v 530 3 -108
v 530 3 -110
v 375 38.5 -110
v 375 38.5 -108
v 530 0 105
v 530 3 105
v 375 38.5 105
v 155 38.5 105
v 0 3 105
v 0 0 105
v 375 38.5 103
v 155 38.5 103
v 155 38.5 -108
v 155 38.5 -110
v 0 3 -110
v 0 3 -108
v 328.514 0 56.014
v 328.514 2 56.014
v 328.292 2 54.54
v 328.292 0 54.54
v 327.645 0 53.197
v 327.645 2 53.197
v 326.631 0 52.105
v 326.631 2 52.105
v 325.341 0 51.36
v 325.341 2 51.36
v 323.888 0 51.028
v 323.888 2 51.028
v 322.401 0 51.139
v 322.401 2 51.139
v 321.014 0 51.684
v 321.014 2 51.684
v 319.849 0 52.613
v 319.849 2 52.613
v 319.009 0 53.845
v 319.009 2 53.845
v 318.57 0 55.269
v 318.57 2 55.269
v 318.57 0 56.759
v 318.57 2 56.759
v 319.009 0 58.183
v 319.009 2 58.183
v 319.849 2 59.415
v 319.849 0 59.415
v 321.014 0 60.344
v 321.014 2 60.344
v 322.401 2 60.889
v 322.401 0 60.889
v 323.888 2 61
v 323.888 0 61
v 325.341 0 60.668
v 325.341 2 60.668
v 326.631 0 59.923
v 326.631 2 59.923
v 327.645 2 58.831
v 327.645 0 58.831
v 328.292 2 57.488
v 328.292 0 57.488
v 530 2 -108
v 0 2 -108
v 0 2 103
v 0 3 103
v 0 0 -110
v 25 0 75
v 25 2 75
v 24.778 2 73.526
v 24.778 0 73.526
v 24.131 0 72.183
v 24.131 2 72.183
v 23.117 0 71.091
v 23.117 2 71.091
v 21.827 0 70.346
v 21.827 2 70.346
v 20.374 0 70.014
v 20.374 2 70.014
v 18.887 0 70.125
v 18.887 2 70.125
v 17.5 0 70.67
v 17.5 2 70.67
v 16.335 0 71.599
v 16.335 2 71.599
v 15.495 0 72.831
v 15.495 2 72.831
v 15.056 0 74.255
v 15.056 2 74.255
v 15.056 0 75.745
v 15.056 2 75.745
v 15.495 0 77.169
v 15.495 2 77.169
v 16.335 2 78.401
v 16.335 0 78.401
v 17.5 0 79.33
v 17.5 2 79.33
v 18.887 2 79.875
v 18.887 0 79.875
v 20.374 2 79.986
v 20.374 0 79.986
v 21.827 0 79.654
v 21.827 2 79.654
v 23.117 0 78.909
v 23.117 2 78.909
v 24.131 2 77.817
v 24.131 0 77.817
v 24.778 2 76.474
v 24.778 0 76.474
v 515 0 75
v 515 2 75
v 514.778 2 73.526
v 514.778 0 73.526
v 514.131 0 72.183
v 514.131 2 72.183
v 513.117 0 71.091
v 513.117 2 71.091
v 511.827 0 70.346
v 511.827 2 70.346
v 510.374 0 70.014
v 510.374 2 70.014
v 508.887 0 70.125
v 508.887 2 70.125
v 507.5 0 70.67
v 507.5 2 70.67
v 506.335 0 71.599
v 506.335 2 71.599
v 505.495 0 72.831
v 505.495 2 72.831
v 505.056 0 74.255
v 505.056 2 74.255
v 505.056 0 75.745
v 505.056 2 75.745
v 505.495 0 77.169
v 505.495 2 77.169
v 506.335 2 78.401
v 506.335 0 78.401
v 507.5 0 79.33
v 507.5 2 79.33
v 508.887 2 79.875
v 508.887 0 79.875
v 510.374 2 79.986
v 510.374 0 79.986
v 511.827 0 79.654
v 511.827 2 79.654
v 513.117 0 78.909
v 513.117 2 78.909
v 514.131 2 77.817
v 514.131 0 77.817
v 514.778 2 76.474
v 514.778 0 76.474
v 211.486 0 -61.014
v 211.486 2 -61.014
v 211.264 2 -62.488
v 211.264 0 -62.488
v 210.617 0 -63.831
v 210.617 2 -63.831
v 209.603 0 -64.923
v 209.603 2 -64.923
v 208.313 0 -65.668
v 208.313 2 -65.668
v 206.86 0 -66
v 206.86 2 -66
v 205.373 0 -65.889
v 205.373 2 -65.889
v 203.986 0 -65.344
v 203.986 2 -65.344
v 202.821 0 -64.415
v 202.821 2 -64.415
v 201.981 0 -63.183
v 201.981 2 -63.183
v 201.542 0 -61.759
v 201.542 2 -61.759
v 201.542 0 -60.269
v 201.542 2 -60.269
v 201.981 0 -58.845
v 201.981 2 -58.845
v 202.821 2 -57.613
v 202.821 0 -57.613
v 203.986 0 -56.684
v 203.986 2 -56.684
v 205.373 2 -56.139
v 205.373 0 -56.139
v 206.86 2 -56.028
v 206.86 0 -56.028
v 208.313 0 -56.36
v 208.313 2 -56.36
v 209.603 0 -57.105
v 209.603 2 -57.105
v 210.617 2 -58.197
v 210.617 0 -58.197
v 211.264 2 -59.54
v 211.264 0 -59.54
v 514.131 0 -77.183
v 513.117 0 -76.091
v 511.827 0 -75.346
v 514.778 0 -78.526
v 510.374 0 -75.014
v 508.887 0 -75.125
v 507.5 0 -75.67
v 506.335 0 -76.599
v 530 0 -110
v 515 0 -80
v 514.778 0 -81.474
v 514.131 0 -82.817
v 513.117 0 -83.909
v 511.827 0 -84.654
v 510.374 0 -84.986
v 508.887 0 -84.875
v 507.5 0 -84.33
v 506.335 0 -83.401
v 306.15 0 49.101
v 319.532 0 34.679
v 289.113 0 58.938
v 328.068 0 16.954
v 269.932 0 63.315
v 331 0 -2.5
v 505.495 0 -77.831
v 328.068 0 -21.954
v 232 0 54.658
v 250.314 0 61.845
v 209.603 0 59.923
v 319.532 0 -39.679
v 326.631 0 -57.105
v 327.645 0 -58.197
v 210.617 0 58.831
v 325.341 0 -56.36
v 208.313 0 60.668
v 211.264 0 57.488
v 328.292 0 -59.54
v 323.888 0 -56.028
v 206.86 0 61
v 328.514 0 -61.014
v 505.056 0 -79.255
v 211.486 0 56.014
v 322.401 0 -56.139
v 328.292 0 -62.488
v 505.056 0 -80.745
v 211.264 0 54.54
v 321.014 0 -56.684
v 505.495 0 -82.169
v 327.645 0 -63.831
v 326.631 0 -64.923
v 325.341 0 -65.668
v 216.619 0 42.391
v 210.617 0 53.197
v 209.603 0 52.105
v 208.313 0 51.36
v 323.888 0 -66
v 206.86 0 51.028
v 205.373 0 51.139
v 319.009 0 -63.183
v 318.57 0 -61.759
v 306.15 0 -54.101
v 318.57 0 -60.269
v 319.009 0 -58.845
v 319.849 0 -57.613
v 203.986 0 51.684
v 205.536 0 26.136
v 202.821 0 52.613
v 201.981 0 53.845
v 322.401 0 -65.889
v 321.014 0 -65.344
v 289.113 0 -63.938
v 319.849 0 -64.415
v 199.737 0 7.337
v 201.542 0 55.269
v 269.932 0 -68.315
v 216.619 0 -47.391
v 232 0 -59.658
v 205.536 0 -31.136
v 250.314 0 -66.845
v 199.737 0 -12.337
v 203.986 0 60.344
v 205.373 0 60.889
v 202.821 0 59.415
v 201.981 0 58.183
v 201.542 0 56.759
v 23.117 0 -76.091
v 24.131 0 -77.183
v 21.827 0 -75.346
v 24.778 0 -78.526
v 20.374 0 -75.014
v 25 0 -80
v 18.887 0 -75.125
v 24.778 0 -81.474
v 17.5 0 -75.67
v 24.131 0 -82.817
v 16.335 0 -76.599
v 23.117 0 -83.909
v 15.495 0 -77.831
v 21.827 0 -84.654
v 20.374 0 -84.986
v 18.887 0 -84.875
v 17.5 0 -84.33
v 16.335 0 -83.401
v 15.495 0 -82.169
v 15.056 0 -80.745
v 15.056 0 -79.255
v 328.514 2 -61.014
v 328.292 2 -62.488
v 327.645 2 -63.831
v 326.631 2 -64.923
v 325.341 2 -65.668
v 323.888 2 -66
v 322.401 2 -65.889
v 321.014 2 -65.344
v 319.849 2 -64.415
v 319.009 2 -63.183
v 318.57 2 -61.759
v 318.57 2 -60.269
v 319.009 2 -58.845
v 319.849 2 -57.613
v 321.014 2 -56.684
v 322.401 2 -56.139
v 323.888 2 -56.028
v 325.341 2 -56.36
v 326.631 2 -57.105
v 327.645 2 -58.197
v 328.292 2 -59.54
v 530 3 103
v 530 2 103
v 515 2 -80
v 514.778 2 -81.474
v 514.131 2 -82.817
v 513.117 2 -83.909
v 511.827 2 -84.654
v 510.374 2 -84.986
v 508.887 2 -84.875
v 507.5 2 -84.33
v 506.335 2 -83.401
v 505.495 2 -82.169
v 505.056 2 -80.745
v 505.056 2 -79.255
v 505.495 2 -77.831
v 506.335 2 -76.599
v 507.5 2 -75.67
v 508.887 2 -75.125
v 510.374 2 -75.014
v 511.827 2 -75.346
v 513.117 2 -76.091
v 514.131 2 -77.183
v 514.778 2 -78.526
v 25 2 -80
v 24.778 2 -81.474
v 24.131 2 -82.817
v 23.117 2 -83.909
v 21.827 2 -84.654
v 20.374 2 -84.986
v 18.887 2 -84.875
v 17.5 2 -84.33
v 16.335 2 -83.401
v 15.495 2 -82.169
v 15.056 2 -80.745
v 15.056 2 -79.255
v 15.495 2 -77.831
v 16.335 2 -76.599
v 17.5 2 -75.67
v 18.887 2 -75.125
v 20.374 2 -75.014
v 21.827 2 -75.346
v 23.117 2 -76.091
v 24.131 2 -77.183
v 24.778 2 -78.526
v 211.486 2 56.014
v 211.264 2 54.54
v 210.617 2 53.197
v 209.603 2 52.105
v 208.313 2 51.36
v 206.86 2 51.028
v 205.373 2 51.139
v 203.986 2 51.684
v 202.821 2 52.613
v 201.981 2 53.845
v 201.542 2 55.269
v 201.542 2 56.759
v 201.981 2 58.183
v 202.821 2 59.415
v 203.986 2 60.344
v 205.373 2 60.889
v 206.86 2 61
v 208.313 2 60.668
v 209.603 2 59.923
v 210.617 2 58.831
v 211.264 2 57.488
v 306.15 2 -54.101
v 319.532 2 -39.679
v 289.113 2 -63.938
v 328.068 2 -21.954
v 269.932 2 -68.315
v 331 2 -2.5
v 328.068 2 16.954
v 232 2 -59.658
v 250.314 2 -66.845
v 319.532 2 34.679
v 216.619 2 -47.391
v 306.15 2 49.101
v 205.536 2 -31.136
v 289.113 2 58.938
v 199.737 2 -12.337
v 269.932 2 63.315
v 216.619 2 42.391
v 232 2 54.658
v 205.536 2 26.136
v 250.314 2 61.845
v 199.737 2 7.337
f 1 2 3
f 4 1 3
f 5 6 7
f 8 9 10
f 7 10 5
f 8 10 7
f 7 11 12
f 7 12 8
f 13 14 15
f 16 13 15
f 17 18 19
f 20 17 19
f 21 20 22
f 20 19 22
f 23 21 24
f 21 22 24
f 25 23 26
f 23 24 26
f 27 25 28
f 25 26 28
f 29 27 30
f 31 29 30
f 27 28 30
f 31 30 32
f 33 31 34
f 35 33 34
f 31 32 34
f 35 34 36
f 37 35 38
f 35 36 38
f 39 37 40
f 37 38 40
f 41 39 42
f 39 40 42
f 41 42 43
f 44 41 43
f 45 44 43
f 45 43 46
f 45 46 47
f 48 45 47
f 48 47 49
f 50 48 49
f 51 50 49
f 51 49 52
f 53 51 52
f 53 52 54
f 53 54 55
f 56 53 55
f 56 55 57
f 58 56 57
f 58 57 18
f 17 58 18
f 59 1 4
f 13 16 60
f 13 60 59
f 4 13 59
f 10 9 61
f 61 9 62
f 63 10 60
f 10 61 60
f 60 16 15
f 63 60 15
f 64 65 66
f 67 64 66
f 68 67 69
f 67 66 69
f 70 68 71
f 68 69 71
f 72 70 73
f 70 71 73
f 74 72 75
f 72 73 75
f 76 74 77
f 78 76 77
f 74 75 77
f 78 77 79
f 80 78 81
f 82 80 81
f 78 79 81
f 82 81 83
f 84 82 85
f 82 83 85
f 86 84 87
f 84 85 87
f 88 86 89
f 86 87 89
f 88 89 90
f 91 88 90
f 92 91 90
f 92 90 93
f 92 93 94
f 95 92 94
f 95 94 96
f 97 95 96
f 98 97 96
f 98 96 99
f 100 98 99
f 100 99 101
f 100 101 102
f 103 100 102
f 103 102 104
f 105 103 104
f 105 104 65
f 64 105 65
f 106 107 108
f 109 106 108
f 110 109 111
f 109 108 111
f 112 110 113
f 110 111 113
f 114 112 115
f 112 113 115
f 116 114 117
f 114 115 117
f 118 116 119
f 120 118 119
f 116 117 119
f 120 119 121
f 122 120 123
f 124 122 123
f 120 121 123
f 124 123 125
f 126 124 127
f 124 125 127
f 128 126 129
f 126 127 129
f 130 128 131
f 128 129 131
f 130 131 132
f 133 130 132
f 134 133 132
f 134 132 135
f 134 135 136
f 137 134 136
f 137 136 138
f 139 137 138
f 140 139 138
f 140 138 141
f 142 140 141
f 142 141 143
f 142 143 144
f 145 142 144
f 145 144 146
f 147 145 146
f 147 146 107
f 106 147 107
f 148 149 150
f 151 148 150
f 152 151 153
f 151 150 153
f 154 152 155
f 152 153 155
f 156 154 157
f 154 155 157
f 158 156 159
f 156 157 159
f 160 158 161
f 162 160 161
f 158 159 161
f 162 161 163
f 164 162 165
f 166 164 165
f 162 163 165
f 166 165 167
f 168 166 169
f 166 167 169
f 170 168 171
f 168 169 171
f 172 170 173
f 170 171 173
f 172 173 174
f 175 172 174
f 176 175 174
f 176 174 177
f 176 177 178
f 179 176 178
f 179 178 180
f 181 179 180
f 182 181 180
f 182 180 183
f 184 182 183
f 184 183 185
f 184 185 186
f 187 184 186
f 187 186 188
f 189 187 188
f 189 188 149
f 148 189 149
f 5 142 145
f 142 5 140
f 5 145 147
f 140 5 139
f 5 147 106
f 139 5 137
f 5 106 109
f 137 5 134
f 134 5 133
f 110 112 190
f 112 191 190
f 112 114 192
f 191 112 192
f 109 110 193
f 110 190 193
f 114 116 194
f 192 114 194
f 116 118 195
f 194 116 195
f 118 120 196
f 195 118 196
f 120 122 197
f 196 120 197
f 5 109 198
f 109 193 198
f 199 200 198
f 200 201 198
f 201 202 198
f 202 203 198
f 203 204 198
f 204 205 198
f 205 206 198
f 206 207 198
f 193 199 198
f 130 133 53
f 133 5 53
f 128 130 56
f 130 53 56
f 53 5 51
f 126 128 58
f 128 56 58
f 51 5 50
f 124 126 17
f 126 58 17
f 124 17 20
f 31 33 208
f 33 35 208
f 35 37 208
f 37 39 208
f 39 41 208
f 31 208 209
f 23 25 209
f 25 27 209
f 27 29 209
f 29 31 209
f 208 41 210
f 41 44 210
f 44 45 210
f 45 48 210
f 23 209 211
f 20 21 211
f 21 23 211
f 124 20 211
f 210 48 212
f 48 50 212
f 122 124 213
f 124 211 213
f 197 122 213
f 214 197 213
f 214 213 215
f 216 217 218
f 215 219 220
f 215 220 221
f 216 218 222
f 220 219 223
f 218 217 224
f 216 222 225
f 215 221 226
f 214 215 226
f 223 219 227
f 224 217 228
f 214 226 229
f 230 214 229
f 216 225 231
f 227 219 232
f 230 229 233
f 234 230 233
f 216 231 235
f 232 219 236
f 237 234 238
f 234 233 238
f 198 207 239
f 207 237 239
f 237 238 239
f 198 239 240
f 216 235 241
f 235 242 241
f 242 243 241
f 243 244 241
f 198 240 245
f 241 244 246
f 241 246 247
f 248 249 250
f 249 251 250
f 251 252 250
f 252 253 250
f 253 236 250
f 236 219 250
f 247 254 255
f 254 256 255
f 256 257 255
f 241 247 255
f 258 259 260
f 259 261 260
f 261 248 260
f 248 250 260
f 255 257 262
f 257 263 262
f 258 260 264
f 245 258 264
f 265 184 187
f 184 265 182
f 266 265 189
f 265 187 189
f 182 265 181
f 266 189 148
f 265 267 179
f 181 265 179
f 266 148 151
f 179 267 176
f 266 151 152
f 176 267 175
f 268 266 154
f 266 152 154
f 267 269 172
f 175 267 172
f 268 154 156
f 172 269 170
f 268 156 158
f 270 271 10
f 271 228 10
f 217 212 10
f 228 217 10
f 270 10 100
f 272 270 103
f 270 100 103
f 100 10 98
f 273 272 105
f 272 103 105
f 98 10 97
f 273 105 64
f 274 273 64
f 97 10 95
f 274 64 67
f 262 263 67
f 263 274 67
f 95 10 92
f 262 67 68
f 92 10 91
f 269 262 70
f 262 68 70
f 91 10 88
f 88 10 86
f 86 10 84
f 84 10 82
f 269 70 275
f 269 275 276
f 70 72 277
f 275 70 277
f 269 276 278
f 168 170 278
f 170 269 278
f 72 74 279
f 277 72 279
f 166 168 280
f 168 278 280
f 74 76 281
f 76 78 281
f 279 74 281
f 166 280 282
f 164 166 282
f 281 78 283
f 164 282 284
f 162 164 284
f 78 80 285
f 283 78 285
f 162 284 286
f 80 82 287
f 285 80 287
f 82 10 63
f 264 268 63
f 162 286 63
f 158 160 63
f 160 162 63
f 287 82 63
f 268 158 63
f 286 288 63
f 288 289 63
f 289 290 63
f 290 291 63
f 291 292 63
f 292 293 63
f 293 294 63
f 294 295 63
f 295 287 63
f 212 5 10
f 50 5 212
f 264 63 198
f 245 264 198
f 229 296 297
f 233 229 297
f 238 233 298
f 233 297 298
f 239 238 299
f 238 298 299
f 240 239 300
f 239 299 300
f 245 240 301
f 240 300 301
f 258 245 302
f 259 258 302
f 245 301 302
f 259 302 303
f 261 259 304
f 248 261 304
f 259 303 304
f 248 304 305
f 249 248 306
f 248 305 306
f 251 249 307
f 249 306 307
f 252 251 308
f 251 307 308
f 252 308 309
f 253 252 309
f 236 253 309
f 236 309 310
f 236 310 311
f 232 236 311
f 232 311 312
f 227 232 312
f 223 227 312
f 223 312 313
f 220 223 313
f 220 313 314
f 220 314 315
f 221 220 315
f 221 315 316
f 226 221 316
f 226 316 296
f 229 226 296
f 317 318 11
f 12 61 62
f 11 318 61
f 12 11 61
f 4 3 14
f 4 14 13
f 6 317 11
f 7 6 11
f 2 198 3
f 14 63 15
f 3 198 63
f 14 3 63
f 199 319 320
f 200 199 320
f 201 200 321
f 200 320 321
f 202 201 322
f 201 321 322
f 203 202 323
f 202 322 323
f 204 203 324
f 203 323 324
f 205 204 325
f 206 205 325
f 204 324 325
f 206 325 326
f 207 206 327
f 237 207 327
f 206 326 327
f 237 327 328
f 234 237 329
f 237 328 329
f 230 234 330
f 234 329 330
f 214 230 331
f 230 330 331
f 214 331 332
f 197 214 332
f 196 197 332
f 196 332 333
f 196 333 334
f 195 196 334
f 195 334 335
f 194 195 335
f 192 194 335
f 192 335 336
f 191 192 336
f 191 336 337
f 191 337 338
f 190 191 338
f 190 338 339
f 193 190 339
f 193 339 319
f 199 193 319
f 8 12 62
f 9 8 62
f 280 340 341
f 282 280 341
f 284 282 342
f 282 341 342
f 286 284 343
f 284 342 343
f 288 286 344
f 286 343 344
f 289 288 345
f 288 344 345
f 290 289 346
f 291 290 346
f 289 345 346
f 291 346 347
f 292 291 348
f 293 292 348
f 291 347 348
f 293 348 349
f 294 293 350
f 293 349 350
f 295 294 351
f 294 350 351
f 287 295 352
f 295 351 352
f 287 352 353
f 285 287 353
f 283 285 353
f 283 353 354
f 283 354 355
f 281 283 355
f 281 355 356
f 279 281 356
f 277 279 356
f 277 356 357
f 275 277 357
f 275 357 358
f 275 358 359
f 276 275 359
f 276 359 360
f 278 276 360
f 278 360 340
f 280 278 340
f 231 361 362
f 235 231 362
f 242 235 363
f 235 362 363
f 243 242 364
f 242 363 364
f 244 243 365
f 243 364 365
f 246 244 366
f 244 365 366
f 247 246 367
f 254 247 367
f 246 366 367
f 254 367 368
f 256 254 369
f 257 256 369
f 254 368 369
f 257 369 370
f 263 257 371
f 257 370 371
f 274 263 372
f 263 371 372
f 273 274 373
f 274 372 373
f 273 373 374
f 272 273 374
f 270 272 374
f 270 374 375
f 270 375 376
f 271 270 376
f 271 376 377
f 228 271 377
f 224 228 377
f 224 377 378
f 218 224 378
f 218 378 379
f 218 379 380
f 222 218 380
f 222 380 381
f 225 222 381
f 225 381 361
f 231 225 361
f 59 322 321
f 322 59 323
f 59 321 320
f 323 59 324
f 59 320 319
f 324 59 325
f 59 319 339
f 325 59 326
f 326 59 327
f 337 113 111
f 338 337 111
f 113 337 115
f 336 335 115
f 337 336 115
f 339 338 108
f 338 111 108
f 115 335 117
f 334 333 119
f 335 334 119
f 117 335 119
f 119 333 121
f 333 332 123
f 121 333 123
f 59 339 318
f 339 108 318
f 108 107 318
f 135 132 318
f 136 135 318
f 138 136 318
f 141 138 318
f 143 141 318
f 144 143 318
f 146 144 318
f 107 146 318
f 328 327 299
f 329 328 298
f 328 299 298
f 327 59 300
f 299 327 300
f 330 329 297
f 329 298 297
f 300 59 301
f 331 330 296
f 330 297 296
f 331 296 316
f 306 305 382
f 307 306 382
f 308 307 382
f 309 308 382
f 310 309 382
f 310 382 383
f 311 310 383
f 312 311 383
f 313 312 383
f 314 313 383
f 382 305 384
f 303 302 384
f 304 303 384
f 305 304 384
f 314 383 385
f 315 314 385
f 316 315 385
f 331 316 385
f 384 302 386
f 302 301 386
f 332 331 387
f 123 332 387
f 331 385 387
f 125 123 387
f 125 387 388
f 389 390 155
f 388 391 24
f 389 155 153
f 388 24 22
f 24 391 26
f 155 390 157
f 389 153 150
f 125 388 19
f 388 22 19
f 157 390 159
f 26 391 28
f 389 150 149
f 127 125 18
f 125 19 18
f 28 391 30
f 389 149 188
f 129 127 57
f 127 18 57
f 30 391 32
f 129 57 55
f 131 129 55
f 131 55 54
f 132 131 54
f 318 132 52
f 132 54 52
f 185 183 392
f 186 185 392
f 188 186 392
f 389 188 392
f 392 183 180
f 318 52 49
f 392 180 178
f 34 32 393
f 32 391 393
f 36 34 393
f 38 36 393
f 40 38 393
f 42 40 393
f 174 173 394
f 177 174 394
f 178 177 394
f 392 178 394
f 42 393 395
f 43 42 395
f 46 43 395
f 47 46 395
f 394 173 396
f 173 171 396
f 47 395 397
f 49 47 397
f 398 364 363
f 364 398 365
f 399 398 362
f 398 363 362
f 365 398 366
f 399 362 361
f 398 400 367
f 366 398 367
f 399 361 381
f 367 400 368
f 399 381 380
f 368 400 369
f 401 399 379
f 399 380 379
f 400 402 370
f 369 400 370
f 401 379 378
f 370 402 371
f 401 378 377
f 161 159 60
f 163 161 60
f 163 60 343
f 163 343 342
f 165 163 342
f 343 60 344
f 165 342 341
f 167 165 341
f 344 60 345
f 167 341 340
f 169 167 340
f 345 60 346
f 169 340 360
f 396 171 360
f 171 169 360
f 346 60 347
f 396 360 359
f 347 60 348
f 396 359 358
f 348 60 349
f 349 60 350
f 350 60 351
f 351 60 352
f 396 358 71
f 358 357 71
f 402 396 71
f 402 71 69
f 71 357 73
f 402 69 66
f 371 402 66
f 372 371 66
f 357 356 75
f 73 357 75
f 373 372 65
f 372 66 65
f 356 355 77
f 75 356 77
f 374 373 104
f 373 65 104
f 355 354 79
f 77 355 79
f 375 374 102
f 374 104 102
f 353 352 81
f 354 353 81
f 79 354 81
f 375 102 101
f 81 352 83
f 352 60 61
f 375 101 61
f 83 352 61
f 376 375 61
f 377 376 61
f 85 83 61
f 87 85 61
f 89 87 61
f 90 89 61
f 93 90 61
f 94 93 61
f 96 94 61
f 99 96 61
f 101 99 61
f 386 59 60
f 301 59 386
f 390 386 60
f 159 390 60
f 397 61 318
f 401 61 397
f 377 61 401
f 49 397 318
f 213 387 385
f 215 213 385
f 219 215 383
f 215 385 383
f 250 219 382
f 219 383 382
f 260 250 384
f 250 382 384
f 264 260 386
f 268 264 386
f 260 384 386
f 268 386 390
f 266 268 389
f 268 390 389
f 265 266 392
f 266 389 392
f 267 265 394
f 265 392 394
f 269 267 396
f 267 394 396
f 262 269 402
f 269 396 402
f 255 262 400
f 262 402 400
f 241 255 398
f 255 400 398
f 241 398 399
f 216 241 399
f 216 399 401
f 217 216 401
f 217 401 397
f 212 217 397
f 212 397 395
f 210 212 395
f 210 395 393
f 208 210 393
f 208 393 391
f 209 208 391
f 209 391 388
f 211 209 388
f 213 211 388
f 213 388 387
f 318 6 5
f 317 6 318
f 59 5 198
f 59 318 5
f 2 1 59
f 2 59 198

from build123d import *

# Parameters (mm, degrees)
EXTRUDE_1_DEPTH     = 530
SKETCH_2_OUTSIDE_W  = 646.648
SKETCH_2_OUTSIDE_H  = 155.148
CUT_EXTRUDE_2_DEPTH = 216
SKETCH_3_R          = 5
SKETCH_3_R_2        = 66
CUT_EXTRUDE_3_DEPTH = 3


with BuildPart() as part:
    # Эскиз1 → Вытянуть-Тонкостенный1 (new body)
    with BuildSketch(Plane(origin=(0, 0, 0), x_dir=(0, 0, -1), z_dir=(1, 0, 0))):
        Polygon((-105, 38.5), (-105, 0), (110, 0), (110, 38.5), (108, 38.5), (108, 2), (-103, 2), (-103, 38.5), align=None)
    extrude(amount=EXTRUDE_1_DEPTH)

    # Эскиз2 outside → Вырез-Вытянуть2 (cut, through all)
    with BuildSketch(Plane(origin=(0, 0, -110), x_dir=(-1, 0, 0), z_dir=(0, 0, -1))):
        with Locations((-265, 19.25)):
            Rectangle(SKETCH_2_OUTSIDE_W, SKETCH_2_OUTSIDE_H)
        Polygon((-530, 0), (-530, 3), (-375, 38.5), (-155, 38.5), (0, 3), (0, 0), align=None, mode=Mode.SUBTRACT)
    extrude(amount=-CUT_EXTRUDE_2_DEPTH, mode=Mode.SUBTRACT)

    # Эскиз3 → Вырез-Вытянуть3 (cut, through all)
    with BuildSketch(Plane(origin=(0, 2, 0), x_dir=(1, 0, 0), z_dir=(0, 1, 0))):
        with Locations((20, 80)):
            Circle(SKETCH_3_R)
        with Locations((20, -75)):
            Circle(SKETCH_3_R)
        with Locations((510, 80)):
            Circle(SKETCH_3_R)
        with Locations((510, -75)):
            Circle(SKETCH_3_R)
        with Locations((265, 2.5)):
            Circle(SKETCH_3_R_2)
        with Locations((323.513972874, 61.013972874)):
            Circle(SKETCH_3_R)
        with Locations((323.513972874, -56.013972874)):
            Circle(SKETCH_3_R)
        with Locations((206.486027126, -56.013972874)):
            Circle(SKETCH_3_R)
        with Locations((206.486027126, 61.013972874)):
            Circle(SKETCH_3_R)
    extrude(amount=-CUT_EXTRUDE_3_DEPTH, mode=Mode.SUBTRACT)


solid = part.part
